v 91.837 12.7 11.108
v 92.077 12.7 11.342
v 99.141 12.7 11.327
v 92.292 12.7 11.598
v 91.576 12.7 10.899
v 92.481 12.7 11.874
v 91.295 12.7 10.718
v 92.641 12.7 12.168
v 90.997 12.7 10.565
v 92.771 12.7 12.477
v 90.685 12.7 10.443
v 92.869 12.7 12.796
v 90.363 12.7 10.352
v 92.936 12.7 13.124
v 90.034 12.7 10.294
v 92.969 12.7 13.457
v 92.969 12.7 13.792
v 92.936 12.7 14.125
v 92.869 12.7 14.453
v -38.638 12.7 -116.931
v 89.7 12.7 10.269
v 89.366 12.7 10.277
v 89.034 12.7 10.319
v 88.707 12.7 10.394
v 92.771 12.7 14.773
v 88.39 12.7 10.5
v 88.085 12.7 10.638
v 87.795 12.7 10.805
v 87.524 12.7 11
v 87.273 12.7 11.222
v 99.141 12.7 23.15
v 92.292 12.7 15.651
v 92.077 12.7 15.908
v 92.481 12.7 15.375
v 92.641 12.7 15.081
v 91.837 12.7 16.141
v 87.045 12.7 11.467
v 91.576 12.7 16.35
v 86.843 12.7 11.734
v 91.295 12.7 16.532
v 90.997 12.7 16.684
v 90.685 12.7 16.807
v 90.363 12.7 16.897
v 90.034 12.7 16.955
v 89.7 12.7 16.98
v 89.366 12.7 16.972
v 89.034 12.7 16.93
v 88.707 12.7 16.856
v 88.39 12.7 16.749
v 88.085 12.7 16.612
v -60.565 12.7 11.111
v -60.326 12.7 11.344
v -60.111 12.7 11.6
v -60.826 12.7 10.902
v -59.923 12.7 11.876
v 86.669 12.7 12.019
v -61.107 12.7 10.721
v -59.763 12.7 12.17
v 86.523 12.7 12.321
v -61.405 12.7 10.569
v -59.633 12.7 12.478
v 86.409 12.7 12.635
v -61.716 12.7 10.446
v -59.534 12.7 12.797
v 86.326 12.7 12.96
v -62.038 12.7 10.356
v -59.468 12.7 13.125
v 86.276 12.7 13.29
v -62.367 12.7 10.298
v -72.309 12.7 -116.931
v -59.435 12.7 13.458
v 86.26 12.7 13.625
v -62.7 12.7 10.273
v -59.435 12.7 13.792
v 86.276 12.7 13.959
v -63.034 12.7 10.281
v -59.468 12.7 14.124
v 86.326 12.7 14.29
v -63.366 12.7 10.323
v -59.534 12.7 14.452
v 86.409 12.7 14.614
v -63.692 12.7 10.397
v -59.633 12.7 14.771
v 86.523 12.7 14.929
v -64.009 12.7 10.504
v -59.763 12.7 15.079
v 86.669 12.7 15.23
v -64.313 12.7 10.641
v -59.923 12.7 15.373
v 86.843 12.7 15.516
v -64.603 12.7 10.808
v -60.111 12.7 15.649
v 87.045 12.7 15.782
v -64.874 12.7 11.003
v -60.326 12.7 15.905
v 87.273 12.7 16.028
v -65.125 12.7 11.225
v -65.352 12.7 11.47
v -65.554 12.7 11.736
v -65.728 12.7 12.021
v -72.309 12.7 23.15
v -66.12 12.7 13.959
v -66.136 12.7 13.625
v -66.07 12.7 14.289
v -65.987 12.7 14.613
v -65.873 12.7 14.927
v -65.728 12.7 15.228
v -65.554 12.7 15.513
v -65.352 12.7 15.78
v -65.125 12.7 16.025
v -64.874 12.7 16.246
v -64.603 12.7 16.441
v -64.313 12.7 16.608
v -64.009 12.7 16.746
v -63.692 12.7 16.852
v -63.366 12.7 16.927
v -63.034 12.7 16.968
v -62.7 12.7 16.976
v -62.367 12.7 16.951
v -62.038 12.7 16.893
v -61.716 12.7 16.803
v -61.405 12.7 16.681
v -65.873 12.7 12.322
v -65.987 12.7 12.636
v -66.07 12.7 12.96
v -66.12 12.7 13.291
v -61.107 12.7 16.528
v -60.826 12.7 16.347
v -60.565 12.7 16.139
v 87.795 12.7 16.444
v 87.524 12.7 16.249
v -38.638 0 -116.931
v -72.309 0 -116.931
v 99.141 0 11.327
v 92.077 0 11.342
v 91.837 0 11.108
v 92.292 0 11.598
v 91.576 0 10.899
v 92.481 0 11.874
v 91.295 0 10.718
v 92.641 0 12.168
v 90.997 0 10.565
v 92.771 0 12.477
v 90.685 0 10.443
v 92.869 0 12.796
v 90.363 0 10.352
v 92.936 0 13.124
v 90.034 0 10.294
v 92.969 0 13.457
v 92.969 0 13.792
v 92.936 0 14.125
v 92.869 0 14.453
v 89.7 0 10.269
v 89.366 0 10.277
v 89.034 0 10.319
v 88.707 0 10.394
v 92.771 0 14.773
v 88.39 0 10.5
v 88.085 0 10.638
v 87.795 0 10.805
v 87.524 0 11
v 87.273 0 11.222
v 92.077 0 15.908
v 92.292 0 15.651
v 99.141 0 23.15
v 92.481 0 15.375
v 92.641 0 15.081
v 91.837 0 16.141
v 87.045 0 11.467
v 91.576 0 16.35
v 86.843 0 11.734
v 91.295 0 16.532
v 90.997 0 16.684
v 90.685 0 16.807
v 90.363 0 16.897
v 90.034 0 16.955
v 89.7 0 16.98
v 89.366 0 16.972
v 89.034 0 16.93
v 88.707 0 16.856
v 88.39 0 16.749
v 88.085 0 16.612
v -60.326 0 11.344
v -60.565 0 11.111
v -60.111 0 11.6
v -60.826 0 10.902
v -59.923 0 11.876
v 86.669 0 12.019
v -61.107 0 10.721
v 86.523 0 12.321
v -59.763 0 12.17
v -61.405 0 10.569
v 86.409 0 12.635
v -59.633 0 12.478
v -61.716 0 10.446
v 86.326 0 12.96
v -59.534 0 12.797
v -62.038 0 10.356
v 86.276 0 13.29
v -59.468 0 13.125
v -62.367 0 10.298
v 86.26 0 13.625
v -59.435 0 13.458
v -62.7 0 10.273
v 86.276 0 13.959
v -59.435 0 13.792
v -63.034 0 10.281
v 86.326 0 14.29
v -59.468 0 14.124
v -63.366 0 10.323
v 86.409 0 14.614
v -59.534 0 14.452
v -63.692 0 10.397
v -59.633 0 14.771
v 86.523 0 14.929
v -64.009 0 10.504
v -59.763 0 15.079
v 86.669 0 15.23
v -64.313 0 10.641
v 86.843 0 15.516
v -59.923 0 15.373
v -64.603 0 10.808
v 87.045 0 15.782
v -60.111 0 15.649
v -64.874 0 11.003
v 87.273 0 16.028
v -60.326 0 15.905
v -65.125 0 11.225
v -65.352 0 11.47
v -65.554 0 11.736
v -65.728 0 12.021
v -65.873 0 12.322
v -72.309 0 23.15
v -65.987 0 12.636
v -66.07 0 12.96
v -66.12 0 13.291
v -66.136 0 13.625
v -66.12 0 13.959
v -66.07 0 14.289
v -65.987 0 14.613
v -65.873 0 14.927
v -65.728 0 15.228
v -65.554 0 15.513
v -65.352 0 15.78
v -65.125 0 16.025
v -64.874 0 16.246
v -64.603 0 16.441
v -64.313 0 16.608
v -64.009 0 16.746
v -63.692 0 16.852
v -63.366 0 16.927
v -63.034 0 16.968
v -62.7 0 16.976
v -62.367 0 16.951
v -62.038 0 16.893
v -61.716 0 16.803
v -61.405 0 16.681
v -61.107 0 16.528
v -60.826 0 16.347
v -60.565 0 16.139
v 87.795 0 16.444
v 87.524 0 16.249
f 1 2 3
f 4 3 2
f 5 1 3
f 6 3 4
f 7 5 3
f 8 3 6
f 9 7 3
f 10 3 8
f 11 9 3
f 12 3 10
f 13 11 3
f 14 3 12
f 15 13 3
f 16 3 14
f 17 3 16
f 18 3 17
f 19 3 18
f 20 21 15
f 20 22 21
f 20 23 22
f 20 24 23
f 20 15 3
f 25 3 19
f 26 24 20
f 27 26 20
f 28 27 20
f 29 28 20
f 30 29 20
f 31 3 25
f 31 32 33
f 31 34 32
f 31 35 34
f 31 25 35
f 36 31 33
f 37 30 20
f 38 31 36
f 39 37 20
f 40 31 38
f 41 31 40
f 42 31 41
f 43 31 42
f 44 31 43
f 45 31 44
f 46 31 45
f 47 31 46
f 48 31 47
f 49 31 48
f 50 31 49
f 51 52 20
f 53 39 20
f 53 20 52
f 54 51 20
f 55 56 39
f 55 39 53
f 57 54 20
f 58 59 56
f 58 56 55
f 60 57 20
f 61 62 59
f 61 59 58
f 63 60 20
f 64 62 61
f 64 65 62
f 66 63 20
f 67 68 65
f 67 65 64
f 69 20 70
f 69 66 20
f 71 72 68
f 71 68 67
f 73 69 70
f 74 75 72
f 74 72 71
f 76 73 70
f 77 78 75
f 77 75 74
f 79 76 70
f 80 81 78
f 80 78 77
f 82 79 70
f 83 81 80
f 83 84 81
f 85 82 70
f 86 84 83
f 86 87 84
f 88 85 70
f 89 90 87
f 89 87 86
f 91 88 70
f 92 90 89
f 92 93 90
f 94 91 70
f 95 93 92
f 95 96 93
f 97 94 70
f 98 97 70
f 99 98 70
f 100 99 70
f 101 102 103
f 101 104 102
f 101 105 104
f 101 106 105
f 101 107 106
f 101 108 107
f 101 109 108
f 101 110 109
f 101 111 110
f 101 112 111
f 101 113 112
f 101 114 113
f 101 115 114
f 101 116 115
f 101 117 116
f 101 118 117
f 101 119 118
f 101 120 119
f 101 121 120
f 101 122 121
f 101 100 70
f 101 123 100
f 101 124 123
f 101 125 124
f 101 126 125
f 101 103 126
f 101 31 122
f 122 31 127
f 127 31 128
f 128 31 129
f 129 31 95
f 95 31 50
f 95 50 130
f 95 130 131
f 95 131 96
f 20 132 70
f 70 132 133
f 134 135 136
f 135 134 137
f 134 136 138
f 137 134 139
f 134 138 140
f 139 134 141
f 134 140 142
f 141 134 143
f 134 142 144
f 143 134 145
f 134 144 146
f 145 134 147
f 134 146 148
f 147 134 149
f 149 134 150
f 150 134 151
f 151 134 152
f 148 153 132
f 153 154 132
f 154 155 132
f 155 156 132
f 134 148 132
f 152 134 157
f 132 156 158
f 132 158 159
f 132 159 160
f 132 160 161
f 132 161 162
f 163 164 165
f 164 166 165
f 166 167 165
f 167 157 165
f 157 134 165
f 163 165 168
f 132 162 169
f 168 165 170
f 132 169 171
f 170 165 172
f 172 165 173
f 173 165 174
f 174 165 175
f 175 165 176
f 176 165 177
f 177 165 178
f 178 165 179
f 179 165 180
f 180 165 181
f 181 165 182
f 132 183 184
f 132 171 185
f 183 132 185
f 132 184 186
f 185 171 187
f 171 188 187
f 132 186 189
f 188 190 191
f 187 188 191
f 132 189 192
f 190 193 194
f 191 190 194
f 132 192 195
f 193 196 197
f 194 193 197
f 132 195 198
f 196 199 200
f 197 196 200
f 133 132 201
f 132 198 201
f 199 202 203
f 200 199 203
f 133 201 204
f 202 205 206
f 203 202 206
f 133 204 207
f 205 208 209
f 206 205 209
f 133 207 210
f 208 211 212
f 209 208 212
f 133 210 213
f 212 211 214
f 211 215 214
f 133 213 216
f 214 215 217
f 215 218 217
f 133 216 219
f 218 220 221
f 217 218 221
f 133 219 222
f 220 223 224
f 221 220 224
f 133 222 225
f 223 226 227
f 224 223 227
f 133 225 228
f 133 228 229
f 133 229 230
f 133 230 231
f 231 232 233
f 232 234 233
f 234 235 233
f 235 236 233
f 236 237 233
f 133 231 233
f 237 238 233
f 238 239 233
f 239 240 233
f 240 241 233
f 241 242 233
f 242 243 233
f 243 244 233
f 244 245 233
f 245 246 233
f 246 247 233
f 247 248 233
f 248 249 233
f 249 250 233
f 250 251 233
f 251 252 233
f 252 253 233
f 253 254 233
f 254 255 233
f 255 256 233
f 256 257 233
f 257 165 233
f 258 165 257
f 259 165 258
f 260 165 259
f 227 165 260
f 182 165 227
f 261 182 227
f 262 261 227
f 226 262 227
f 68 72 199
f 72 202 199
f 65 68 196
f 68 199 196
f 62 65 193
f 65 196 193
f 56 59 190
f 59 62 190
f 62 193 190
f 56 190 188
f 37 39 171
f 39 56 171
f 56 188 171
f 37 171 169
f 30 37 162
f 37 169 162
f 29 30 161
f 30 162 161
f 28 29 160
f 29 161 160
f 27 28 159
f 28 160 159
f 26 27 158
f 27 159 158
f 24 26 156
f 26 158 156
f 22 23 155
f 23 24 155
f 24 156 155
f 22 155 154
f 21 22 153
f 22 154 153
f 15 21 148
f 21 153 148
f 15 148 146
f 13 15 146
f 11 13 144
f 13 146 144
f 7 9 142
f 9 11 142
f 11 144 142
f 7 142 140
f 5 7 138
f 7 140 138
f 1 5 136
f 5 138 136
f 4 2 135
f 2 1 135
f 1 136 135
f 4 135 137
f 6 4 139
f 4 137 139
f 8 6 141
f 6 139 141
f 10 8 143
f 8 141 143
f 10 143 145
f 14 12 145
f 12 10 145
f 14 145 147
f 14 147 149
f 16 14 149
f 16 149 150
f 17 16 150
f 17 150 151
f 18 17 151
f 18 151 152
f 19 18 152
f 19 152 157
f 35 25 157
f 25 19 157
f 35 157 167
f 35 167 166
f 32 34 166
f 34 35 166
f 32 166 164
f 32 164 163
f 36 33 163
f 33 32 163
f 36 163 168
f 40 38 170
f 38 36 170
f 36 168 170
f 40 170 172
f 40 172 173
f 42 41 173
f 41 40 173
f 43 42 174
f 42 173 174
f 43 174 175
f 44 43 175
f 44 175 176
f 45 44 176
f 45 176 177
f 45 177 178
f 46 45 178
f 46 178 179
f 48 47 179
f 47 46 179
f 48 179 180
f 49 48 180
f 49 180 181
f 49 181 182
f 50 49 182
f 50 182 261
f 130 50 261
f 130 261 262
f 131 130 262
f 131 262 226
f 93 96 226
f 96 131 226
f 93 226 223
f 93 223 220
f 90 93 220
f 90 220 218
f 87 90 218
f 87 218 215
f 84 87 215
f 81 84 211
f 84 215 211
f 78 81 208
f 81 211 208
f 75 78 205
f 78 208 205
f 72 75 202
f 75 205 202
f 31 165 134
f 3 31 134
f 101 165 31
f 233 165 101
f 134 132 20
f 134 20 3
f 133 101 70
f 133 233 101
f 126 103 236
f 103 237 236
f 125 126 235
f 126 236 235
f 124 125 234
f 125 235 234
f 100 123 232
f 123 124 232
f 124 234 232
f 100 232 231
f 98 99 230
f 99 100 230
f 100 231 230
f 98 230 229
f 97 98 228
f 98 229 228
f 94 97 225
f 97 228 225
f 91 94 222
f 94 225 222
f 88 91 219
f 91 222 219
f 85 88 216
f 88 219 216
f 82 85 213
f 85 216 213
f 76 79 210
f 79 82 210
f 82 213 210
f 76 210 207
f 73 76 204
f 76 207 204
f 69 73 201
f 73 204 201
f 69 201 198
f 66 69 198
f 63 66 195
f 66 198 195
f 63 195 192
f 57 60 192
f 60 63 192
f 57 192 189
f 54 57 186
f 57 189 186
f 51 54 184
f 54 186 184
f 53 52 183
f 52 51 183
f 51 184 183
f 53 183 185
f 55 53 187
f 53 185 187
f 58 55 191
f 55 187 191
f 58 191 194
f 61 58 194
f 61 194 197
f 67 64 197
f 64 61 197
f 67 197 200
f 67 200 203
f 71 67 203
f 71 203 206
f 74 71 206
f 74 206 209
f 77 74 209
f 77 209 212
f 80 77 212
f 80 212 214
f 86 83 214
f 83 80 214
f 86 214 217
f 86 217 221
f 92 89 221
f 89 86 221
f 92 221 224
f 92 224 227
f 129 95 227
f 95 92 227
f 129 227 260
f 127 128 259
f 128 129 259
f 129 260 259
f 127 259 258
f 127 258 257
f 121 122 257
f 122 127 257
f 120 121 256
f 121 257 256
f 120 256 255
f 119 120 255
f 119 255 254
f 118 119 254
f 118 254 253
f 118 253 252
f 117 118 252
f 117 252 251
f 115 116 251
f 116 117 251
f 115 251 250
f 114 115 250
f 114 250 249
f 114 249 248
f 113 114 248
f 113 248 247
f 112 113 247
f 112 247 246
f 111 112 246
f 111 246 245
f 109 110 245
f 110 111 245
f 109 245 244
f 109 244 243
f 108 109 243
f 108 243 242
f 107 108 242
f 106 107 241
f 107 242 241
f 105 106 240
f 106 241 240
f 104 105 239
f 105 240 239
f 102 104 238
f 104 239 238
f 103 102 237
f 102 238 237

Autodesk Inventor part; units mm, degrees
ref_plane "YZ Plane" through (0, 0, 0) normal (1, 0, 0) x (0, 1, 0)
ref_plane "XZ Plane" through (0, 0, 0) normal (0, 1, 0) x (-1, 0, 0)
ref_plane "XY Plane" through (0, 0, 0) normal (0, 0, 1) x (1, 0, 0)
sketch "Sketch1" plane through (0, 0, 0) normal (0, 1, 0) x (-1, 0, 0)
  line L0 (-111.8414, 23.1497) -> (72.3086, 23.1497)
  line L1 (72.3086, 23.1497) -> (72.3086, -148.2749)
  line L2 (72.3086, -148.2749) -> (-111.8414, 23.1497)
  circle A0 centre (62.7836, 13.6247) radius 3.3528
  circle A1 centre (-89.6164, 13.6247) radius 3.3566
  line L3 (-99.1414, 23.1497) -> (-99.1414, 11.3273)
  line L4 (38.6383, -116.9313) -> (72.3086, -116.9313)
  point P0 (0, 0)
  dimension "d0" = 184.15
  dimension "d1" = 171.4246
  dimension "d2" = 6.7056
  dimension "d3" = 9.525
  dimension "d4" = 6.7132
  dimension "d5" = 152.4
  dimension "d8" = 12.7
  dimension "d9" = 9.525
  dimension "d10" = 140.081
extrude "Extrusion1" add sketch "Sketch1" along normal blind 12.7 contours L0 L1 L4 L2 L3
properties part number "BallGuidePlyRight"
